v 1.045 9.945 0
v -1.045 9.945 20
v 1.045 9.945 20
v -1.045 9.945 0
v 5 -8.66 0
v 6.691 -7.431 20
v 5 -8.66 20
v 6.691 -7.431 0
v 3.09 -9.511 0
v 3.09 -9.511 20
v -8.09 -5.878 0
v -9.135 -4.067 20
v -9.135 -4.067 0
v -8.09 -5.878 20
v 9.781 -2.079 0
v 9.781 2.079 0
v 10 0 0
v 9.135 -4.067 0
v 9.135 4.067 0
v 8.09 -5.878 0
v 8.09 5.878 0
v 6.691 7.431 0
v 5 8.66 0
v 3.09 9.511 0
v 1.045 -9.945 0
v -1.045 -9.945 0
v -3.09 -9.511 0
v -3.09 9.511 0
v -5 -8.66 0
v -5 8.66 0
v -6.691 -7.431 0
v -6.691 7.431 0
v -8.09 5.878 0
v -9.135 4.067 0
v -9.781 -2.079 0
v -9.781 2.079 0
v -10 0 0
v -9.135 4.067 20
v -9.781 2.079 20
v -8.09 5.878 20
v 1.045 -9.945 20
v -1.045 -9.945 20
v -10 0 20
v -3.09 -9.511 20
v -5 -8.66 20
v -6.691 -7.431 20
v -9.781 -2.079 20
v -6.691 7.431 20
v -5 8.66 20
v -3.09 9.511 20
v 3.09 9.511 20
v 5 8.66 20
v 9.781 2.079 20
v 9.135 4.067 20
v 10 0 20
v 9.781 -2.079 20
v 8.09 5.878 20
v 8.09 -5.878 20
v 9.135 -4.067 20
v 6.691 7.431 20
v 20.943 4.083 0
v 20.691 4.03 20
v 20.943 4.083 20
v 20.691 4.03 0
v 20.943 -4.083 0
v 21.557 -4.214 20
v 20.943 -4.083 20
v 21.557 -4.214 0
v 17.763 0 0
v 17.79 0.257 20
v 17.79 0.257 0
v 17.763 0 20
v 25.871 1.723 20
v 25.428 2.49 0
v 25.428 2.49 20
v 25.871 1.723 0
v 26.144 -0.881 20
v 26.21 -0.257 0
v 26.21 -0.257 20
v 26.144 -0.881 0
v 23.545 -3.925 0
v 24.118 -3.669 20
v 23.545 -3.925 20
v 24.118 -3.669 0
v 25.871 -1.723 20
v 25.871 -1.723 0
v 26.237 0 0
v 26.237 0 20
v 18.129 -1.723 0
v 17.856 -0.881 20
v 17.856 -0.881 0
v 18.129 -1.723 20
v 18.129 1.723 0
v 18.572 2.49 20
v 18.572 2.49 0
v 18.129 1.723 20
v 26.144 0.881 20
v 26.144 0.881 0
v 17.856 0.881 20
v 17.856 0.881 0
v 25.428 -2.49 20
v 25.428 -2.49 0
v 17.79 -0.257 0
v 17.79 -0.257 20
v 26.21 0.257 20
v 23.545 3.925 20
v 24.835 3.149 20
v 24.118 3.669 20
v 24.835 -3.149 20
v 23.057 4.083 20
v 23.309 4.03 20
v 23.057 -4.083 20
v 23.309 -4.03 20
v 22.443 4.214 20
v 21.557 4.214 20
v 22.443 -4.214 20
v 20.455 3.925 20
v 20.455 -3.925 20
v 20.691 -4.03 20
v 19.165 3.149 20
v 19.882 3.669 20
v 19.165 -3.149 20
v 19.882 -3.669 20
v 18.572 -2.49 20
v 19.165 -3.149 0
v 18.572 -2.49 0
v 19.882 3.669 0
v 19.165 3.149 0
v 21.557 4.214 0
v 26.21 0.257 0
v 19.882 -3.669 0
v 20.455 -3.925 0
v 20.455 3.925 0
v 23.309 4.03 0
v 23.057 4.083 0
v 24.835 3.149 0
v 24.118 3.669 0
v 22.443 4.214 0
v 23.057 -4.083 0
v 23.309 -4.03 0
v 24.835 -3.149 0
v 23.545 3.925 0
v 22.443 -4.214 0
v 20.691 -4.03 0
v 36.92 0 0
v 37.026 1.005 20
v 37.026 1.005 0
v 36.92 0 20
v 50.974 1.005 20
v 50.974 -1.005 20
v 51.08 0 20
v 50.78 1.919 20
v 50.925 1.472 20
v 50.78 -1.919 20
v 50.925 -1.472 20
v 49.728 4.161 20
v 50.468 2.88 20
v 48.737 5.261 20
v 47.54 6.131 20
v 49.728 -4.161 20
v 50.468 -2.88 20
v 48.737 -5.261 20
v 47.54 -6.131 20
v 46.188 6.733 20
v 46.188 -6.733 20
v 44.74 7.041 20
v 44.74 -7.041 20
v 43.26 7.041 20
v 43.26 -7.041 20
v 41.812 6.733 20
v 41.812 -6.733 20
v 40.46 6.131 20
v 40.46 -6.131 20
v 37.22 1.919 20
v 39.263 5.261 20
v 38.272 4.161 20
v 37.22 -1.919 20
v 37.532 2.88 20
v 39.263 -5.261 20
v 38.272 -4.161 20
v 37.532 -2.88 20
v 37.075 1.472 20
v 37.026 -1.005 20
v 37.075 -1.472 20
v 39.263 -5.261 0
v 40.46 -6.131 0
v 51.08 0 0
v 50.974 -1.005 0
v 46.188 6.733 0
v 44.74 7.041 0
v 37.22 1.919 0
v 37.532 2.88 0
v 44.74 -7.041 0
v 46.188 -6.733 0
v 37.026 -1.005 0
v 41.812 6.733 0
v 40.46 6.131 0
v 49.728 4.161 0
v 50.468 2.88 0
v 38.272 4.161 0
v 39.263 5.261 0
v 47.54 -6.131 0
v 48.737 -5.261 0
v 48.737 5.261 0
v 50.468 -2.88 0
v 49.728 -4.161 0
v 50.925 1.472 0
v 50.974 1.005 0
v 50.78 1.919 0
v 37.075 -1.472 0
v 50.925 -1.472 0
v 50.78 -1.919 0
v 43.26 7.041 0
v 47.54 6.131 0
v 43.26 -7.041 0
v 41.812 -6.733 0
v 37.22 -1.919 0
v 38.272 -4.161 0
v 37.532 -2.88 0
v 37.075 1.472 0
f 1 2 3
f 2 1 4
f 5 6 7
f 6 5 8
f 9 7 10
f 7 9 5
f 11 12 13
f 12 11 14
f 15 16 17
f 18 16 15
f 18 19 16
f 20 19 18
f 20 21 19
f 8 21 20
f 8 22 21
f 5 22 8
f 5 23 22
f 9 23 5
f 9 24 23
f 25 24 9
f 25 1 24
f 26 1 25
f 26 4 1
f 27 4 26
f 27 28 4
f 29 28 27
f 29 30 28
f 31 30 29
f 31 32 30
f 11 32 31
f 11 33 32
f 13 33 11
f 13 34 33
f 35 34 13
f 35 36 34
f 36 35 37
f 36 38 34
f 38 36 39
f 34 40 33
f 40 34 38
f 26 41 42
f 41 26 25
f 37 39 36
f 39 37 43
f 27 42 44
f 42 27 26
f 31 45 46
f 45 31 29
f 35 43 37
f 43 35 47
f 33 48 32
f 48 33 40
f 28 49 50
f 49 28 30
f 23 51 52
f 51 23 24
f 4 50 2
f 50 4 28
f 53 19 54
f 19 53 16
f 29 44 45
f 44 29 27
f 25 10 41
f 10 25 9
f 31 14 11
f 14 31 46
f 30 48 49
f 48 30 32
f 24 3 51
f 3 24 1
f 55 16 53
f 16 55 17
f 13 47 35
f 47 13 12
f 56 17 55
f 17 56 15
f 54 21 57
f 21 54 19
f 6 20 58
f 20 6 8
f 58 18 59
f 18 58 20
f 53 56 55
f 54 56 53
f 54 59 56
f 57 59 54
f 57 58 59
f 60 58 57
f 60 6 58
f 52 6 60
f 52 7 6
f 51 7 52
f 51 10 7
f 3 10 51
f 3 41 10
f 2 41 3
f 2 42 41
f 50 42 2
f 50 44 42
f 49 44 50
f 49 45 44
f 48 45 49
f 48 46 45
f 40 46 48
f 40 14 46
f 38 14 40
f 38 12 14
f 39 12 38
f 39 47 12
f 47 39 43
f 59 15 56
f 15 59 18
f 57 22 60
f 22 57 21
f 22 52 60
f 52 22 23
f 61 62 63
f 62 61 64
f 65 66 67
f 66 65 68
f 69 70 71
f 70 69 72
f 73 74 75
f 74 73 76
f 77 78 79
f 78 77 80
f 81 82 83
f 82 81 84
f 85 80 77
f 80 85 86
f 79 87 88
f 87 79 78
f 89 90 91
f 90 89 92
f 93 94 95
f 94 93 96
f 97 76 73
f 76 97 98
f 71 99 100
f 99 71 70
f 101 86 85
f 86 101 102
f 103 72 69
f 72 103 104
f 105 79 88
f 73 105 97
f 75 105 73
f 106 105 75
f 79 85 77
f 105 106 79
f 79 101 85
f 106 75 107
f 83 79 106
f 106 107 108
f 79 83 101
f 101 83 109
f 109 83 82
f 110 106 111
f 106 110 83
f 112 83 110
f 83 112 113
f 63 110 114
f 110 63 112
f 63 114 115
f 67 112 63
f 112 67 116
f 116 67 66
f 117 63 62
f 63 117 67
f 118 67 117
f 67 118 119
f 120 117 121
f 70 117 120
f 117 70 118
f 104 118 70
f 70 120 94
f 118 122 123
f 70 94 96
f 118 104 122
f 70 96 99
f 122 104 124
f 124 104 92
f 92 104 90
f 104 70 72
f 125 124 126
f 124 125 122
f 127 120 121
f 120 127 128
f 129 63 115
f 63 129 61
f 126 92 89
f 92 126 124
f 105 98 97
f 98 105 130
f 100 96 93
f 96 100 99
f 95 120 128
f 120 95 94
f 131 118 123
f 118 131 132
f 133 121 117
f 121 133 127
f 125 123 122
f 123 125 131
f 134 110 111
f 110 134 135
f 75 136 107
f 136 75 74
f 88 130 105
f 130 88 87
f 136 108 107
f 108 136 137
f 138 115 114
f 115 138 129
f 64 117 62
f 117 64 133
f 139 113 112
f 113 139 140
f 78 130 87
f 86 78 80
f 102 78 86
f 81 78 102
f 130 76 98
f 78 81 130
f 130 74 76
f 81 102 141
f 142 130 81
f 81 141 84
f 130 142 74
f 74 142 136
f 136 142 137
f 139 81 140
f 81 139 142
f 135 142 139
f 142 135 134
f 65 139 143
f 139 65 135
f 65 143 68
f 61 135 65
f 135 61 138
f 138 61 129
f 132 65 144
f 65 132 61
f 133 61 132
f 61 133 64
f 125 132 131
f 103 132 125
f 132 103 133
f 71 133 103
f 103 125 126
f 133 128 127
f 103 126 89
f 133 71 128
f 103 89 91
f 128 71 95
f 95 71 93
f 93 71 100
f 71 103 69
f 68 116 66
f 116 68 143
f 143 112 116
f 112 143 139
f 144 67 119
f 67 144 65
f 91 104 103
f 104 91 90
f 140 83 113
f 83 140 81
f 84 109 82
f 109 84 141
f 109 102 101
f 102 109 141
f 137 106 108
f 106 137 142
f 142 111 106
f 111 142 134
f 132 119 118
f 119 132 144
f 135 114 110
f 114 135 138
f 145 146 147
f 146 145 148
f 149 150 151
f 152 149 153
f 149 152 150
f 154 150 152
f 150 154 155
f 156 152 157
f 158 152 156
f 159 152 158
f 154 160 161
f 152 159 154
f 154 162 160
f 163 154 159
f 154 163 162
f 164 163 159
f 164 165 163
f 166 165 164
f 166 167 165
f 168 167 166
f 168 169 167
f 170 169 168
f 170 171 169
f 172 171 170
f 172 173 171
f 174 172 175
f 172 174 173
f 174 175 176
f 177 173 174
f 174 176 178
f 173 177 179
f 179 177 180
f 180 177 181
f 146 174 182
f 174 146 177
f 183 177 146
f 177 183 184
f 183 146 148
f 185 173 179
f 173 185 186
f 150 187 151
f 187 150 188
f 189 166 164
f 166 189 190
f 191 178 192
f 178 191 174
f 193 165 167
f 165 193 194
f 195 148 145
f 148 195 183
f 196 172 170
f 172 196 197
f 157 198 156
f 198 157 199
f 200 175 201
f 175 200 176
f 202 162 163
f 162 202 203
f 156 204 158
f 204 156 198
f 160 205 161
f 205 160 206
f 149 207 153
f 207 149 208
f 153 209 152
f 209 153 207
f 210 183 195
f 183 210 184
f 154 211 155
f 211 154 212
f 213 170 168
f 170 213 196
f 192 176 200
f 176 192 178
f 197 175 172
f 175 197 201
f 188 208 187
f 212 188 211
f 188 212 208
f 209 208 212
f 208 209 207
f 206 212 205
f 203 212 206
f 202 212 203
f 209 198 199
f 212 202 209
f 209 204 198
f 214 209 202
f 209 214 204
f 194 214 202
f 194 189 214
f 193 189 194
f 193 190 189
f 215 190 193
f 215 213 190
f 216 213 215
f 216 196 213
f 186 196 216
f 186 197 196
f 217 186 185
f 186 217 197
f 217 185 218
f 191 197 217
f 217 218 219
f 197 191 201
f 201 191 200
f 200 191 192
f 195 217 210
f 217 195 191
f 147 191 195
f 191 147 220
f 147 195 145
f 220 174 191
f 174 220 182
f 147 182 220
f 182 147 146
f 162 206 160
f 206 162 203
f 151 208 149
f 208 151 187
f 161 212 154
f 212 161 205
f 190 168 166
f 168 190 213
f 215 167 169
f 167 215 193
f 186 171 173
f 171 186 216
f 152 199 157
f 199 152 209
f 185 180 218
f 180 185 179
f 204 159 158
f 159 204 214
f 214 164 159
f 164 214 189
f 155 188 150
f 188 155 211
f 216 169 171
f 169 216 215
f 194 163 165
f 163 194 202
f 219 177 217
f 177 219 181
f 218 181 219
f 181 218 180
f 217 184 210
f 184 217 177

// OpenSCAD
// Empty
projection();
// No children
projection() { }
// 2D child
projection(cut=true) { square(); }

linear_extrude(height=20) projection(cut=false) sphere(r=10);
translate([22,0,0]) linear_extrude(height=20) projection(cut=true) translate([0,0,9]) sphere(r=10);
translate([44,0,0]) linear_extrude(height=20) projection(cut=true) translate([0,0,7]) sphere(r=10);
